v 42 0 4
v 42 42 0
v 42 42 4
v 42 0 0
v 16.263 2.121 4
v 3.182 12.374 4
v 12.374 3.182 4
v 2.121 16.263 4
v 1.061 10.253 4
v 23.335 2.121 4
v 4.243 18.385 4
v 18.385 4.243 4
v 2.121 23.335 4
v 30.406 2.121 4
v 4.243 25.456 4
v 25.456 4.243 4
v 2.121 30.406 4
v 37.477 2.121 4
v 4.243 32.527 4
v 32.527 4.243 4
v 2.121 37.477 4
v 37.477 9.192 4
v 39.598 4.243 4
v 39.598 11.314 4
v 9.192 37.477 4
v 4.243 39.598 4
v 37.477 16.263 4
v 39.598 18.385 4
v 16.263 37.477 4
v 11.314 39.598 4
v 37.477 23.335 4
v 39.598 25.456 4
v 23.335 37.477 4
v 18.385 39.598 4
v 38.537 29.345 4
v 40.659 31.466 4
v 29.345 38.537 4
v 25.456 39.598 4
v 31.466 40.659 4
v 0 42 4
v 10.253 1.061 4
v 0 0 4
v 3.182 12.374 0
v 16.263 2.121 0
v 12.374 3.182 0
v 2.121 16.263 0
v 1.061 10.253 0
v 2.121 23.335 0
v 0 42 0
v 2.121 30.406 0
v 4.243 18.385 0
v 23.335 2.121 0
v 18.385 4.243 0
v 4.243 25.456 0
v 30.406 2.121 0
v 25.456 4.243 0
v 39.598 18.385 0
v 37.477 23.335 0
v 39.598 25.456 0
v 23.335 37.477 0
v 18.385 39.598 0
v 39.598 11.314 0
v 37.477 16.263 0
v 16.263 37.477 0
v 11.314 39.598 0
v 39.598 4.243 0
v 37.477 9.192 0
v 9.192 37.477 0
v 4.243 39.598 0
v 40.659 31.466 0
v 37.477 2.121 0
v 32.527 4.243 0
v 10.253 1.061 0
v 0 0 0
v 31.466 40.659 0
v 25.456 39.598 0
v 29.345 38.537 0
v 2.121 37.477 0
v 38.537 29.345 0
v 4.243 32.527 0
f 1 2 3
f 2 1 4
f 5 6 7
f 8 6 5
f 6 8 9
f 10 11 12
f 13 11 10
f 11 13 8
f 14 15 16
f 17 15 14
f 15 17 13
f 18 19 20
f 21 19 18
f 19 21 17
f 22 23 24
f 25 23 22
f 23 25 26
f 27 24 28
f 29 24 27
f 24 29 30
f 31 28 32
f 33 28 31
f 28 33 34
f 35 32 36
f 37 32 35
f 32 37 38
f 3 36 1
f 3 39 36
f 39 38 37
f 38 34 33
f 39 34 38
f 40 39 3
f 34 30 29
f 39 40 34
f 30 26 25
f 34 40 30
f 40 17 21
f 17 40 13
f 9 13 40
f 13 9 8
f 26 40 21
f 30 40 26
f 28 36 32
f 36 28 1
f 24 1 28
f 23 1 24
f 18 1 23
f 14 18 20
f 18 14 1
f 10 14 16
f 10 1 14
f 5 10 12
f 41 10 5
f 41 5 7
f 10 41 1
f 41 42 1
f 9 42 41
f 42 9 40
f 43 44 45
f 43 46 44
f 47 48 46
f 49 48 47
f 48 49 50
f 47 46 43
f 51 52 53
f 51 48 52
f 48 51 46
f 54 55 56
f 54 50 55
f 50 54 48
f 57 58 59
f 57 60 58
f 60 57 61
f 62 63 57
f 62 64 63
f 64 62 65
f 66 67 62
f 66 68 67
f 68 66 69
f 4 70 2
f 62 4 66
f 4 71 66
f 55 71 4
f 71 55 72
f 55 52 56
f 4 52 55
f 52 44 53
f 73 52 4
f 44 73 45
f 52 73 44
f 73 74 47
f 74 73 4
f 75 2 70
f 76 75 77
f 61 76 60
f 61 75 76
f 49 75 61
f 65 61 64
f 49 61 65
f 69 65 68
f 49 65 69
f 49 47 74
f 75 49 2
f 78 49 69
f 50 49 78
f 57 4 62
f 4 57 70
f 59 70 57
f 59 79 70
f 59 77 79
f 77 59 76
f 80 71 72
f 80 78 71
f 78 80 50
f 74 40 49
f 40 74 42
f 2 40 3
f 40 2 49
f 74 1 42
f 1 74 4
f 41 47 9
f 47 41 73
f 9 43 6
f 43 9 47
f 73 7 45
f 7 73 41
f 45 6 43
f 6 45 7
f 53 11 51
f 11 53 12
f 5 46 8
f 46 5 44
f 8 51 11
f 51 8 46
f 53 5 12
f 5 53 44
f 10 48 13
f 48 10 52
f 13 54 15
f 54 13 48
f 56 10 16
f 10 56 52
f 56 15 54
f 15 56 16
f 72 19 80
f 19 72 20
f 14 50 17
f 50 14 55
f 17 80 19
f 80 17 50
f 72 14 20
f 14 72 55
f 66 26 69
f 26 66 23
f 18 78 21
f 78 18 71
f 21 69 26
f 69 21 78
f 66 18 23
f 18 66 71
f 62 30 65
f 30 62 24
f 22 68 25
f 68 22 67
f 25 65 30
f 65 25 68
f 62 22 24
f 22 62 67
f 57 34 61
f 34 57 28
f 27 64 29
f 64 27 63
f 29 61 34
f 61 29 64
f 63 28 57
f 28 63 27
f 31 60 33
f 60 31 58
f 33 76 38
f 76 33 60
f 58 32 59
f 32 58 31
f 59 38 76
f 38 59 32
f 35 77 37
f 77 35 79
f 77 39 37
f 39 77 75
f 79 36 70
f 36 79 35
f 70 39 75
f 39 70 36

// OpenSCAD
w = 42;
d = 42;
h = 4;

difference(){
cube([w,d,h]);
    
rotate([0,0,15]);

difference(){
    rotate([0,0,45])
    translate([+8,-6.5,-1])
    color("green")cube([3,13,8]);
}
difference(){
    rotate([0,0,45])
    translate([+13,-10,-1])
    color("green")cube([3,20,8]);
}
difference(){
    rotate([0,0,45])
    translate([+18,-15,-1])
    color("green")cube([3,30,8]);
}
difference(){
    rotate([0,0,45])
    translate([+23,-20,-1])
    color("green")cube([3,40,8]);
}
difference(){
    rotate([0,0,45])
    translate([+28,-25,-1])
    color("green")cube([3,50,8]);
}
difference(){
    rotate([0,0,45])
    translate([+33,-20,-1])
    color("red")cube([3,40,8]);
}
difference(){
    rotate([0,0,45])
    translate([+38,-15,-1])
    color("red")cube([3,30,8]);
}
difference(){
    rotate([0,0,45])
    translate([+43,-10,-1])
    color("red")cube([3,20,8]);
}
difference(){
    rotate([0,0,45])
    translate([+48,-6.5,-1])
    color("red")cube([3,13,8]);
}
}
